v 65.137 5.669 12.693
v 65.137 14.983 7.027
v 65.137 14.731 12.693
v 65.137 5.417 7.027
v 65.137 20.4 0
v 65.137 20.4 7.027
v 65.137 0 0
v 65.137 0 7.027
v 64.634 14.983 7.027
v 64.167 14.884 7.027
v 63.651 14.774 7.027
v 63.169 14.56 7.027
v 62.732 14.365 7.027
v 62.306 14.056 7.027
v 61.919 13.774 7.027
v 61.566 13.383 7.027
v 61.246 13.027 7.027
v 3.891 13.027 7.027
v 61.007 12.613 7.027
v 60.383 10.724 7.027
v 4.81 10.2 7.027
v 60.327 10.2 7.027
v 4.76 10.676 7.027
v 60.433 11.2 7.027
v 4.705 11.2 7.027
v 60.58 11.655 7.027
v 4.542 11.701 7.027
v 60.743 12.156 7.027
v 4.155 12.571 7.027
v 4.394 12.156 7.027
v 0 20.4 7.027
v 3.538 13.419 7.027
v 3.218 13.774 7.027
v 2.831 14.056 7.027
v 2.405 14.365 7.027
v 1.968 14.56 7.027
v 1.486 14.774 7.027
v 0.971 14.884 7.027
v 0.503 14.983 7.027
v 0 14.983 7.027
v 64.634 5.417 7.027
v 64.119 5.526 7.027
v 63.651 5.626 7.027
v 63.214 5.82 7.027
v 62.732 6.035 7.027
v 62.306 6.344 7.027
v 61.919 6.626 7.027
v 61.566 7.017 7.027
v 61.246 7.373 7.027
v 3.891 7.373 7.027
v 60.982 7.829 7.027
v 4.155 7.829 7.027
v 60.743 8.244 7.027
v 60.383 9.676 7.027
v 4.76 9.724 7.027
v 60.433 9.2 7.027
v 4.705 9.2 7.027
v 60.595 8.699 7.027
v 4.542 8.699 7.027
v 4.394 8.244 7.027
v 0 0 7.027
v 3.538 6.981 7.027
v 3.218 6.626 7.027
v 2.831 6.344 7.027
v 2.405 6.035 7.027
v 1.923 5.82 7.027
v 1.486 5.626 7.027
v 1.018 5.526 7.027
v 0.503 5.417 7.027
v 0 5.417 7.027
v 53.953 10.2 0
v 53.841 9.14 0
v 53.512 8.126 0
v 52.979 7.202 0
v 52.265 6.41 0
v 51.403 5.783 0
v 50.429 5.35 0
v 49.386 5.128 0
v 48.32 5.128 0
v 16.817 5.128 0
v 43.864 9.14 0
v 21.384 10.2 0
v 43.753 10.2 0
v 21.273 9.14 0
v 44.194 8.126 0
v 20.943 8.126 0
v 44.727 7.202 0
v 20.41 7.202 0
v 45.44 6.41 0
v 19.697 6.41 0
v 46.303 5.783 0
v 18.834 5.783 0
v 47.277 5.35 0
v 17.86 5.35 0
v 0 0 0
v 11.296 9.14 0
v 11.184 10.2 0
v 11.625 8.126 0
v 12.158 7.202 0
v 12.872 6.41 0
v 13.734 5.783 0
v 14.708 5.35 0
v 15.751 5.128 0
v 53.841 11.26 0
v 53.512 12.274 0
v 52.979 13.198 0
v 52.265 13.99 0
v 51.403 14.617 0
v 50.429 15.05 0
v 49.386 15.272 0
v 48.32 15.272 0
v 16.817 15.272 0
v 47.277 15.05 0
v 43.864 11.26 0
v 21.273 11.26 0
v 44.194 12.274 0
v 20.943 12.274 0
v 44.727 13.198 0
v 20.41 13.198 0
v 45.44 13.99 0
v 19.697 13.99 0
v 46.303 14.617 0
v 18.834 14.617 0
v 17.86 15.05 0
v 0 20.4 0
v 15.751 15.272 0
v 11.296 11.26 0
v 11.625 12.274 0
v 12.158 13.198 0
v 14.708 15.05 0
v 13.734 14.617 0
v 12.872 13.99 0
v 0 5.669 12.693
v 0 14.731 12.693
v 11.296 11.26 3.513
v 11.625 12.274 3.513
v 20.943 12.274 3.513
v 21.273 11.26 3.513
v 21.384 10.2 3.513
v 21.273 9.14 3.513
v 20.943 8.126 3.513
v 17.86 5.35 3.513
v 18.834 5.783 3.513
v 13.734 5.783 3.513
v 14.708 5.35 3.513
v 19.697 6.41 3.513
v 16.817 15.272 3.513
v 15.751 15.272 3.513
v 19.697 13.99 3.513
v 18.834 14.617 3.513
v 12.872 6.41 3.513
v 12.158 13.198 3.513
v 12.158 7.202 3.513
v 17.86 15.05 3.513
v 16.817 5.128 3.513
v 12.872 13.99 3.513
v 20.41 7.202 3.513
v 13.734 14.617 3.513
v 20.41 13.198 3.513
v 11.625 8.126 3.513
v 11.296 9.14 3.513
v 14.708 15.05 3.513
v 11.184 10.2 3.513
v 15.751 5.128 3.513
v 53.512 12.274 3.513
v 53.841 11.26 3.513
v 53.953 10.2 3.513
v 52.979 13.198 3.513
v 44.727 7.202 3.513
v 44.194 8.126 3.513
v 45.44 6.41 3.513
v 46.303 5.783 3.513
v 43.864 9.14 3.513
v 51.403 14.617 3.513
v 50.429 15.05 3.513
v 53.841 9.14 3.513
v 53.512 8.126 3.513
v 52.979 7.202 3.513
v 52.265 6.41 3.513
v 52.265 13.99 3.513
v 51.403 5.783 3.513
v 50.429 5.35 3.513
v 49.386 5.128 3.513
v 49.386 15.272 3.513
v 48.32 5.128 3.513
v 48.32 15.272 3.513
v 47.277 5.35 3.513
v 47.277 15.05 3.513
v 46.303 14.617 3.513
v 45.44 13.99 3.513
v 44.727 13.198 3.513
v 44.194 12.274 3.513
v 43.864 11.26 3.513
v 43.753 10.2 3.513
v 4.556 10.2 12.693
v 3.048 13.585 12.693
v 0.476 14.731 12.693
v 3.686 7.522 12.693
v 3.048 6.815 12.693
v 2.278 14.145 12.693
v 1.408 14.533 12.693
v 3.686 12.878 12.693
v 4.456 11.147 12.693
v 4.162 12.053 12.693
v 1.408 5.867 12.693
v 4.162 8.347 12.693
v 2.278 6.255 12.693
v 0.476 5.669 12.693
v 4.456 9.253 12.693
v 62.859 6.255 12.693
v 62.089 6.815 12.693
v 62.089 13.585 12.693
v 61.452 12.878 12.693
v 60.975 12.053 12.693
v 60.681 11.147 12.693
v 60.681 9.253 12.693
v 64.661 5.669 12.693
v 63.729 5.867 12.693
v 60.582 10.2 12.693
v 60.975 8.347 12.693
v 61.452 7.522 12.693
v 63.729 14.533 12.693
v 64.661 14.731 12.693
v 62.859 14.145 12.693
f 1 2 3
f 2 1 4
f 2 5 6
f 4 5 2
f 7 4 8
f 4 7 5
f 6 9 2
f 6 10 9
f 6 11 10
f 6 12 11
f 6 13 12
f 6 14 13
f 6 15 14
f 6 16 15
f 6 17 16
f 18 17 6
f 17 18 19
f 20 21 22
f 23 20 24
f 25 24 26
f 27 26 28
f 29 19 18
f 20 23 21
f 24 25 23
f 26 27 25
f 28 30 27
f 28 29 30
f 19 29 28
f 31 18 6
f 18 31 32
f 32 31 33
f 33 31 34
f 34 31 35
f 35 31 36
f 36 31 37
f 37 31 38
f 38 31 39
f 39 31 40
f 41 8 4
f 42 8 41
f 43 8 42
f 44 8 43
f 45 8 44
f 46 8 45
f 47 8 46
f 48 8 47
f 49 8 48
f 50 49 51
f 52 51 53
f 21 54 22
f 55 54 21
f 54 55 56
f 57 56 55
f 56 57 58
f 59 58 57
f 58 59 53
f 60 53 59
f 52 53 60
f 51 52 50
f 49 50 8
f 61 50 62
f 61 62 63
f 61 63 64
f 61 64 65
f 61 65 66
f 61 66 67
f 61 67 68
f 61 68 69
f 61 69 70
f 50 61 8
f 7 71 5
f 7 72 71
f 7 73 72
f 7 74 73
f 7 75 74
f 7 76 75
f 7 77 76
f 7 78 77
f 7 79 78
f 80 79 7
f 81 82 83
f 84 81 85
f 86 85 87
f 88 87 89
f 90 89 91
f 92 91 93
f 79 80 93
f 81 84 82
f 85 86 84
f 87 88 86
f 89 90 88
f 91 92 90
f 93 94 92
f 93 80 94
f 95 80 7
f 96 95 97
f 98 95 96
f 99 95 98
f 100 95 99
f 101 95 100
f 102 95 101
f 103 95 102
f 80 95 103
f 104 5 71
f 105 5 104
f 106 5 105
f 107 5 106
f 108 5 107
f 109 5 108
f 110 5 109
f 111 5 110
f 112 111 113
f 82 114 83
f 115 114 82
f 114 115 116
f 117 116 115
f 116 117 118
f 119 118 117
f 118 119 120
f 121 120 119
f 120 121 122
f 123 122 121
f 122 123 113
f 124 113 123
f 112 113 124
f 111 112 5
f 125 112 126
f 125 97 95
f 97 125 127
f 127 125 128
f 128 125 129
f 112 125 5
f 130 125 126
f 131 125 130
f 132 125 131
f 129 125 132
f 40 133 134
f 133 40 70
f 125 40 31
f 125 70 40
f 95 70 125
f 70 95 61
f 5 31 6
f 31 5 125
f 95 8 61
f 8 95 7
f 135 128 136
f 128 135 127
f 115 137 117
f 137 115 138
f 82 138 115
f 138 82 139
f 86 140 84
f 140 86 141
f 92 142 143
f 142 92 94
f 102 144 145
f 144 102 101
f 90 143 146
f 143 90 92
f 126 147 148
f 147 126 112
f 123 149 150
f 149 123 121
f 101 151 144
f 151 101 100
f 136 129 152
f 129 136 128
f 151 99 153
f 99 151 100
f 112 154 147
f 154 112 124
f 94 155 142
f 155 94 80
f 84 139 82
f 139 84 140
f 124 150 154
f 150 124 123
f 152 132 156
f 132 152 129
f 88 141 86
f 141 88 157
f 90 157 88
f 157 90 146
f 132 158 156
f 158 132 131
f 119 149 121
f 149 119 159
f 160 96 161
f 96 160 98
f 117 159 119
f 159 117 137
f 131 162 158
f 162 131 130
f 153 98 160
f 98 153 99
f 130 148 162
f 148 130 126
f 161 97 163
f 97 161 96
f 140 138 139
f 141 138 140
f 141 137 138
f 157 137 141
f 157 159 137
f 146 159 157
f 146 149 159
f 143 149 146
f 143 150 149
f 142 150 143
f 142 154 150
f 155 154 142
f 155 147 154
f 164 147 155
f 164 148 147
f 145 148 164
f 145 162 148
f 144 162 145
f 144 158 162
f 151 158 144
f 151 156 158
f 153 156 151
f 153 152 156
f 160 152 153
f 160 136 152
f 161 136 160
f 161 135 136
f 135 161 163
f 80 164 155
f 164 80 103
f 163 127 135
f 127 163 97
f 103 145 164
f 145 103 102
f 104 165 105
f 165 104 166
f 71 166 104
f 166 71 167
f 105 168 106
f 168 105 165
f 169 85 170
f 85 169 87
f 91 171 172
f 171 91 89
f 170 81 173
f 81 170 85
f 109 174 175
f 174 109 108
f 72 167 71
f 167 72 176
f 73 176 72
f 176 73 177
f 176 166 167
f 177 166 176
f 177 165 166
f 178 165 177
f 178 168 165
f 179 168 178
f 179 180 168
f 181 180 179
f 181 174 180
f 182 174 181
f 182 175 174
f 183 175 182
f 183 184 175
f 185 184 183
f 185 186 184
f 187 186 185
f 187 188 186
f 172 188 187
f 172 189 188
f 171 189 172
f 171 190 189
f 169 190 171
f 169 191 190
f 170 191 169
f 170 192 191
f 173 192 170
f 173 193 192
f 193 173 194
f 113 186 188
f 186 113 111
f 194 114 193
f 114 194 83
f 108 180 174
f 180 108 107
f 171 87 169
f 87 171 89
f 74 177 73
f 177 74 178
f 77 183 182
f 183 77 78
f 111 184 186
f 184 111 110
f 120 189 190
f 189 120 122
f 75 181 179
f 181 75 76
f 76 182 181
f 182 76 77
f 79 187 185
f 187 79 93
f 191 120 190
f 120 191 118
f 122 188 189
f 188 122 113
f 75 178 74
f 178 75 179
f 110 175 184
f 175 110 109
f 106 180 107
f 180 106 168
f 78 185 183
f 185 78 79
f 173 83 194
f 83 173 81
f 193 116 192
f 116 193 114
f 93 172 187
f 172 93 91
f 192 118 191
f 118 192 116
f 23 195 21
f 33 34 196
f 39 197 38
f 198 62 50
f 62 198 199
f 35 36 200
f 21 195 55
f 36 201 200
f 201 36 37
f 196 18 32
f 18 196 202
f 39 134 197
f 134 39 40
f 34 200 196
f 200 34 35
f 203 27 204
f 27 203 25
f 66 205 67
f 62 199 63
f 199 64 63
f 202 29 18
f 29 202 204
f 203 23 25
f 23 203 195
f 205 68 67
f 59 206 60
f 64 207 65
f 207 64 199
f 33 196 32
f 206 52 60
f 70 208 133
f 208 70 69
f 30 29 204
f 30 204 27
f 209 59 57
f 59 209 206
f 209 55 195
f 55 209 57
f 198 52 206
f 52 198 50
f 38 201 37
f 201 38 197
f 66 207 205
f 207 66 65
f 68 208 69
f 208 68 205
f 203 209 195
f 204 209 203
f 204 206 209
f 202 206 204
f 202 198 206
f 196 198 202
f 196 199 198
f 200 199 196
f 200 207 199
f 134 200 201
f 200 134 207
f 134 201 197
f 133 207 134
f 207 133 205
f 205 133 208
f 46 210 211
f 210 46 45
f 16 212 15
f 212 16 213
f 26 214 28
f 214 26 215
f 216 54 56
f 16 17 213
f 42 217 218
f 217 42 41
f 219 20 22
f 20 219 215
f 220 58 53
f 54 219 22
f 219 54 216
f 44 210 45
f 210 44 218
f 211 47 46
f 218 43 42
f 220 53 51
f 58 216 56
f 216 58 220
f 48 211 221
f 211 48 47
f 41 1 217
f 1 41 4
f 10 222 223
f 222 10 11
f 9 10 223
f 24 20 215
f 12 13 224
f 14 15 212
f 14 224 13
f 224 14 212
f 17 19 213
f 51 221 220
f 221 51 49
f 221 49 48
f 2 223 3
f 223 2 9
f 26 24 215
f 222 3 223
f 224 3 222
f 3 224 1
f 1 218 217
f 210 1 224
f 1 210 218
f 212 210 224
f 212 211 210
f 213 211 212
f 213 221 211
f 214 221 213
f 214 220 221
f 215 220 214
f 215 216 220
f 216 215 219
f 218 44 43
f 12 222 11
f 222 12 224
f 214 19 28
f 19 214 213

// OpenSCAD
coldiameter = 17;
mod = coldiameter;
cpo = mod/10; // capitol offset
ch = mod*5* 1.24;
colid = 10.25;  			    //inner (open) diameter of column
colih = mod/3;				   // height of boss for column
length = ch * .618;  // for golden rectangle
height = ch/15;
width = (mod + (cpo*2))* 1.0;  //allows over or under hang if desired
angle = 1;

echo("Width=",width);

f_overhang = 2;			  //frieze overhang
f_height = height*2;		  //frieze height
f_d = .03; 					// amount of triglyph inset

c_overhang = 2;			  //cornice overhang
c_height = height *2/3;		  //cornice height
c_length = length;

//abacus();
//multi_abacus();
beam();
//corner();
//qr();
//tri();
//frieze_beam(2); 		  // parmeter is number of trigliphs
//frieze_corner();
//rotate([180,0,0]) translate([0,-18,-f_height-c_height]) {cornice_beam();}
//cornice_beam(1);
//cornice_corner();


module cornice_corner() {

}

module cornice_beam(type) {
	if ( type == 0 ) {
		cube([c_length,width+c_overhang,c_height]);
		}
	if ( type == 1 ) {
		cube([c_length*.75,width+c_overhang,c_height]);
		}
	
	translate([length*.065,width/6.5,c_height])
		cube([length/2-(length*.125),width-(width*.25),c_height/1.5]);

		if (type == 0 ) {
		translate([length/2 + (length*.065),width/6.5,c_height])
			cube([length/2-(length*.125),width-(width*.25),c_height/1.5]);
		}
		if (type == 1 ){
		translate([length/2 + (length*.055),width/6.5,c_height])
			cube([length/2-(length*.312),width-(width*.25),c_height/1.5]);
		}

}


module frieze_corner() {
	union() {	
	difference() {
	cube([length/2+mod/4,width,f_height]);
	translate([length/25,width/10,height/10])
		cube([length/2+mod/4-length/12,width-width/5,f_height]);
	translate([width/2,width/2,0])
		cylinder(h = height/2, r = width/8, $fs = angle);
	}
	//translate([width-length/20,0,0])  cube([length/25,width,f_height]);
	rotate([0,90,0]) {
		qr(length/2+mod/4);
	}
	translate([0,-f_height/12,f_height*.7]) cube([length/2+mod/4,f_height/12,f_height/6]);
	translate([0,0,f_height]) rotate([90.001,0,90])  {
		qr(length/2+mod/4);
	}
	translate([mod/4,-f_height/10,0])
		tri();
	//translate([(length/4)*2+(length/10),-f_height/15,0])
	//	tri();
	}
	union() {
	difference() {
	cube([width,(length/2)+(mod*.75),f_height]);
	translate([width/10,length/30,height/10])
		cube([width-width/5,(length/2)+(mod*.75)-length/15,f_height]);
	translate([width/2,width/2,0])
		cylinder(h = height/2, r = width/8, $fs = angle);
//	translate([width/2,3*length/4,0])
//		cylinder(h = height/2, r = width/8, $fs = angle);	
	}
	//translate([0,width-length/20,0])  cube([length/20,width,f_height]);
	translate([0,length/1.317,0]) rotate([90,90,0]) {
		qr(((length/2)+mod*.79));
	}
	translate([0,-length*.015,f_height]) rotate([180.001,270,90])  {
		qr(((length/2)+mod*.79));
	}
	translate([-f_height/12,-f_height/12,f_height*.7]) cube([f_height/12,length/2+coldiameter*.75+f_height/12,f_height/6]);
	translate([-f_height/10,mod*.76,0]) rotate([0,0,270])
		tri();
	translate([-f_height/10,length-(mod*.7),0]) rotate([0,0,270])
		tri();
	}
}


module frieze_beam(number) {
union() {
	difference() {
	cube([length,width,f_height]);
	translate([length/20,width/10,height/10])
		cube([length-length/10,width-width/5,f_height]);
	translate([length/4,width/2,0])
			cylinder(h = height/2, r = width/8, $fs = angle);
	translate([3*length/4,width/2,0])
			cylinder(h = height/2, r = width/8, $fs = angle);	}
	translate([length/2-length/20,0,0])  cube([length/10,width,f_height]);
	rotate([0,90,0]) {
		qr(length);
	}
	translate([0,0,f_height]) rotate([90.001,0,90])  {
		qr(length);
	}
//	translate([0,width,0]) rotate([90,180,90])  {
//		qr(length);
//	}
//	translate([0,width,f_height]) rotate([90,270,90])  {
//		qr(length);
//	}
#translate([0,-f_height/12,f_height*.7]) cube([length,f_height/12,f_height/6]);
if ( number == 3 ) {
	translate([0,-f_height/15,0])
		tri();
	translate([(length/5)*2,-f_height/15,0])
		tri();
	translate([(length/5)*4,-f_height/15,0])
		tri();
	}
else if ( number == 2 ){
	translate([(length/4)*0,-f_height/10,0])
		tri();
	translate([(length/4)*2,-f_height/10,0])
		tri();
	}
}
}


module qr(len) {

	difference() {
		cylinder(h = len, r = f_height/6, $fs = angle);
		translate([-f_height/3,0,0])
			cube([f_height/2.5,f_height/4,len]);
		translate([0,-f_height/4,0])
			cube([f_height/4,f_height/2,len]);
		}
}

module tri() {
	difference() {

		translate([0,0,f_height/7])
			cube([mod/2,f_height/10,f_height-f_height/3]);					//basic plate shape
		translate([0,-f_height*f_d,0])
			scale([1,1.5,1]) cylinder(r = mod*.05, h = f_height-f_height/6, $fs = .05);	//left half groove
		translate([modr*.167,-f_height*f_d,0])
			scale([1,1.5,1]) cylinder(r = mod*.05, h = f_height-f_height/6, $fs = .05);	//left full groove
		translate([mod*.333,-f_height*f_d,0])
			scale([1,1.5,1]) cylinder(r = mod*.05, h = f_height-f_height/6, $fs = .05);	//right full groove
		translate([mod/2,-f_height*f_d,0])
			scale([1,1.5,1]) cylinder(r = mod*.05, h = f_height-f_height/6, $fs = .05);	//right half groove
		}
	translate([0,-f_height/20,f_height*.7])
		cube([mod/2,f_height/7,f_height/7]);
}

module beam() {
	difference() {
		cube([length, width, height]);
		translate([length/4,width/2,0])
			cylinder(h = height/2, r = width/4, $fs = angle);
		translate([3*length/4,width/2,0])
			cylinder(h = height/2, r = width/4, $fs = angle);		}
	difference() {
		translate([0,width/2,0])
			cylinder(h = (height + colih), r1 = colid/2, r2 = colid/2.25, $fs = angle);
		translate([-colid/2,0,0])
			cube([colid/2,width,height*2]);
		}
	difference() {
		translate([length,width/2,0])
			cylinder(h = (height + colih), r1 = colid/2, r2 = colid/2.25, $fs = angle);
		translate([length,0,0])
			cube([colid/2,width,height*2]);
		}
}

module corner() {
	difference() {
		cube([length+width/2, width, height]);
		translate([width/2,width/2,0])
			cylinder(h = height/2, r = width/8, $fs = angle);
		translate([3*(length+width/2)/4,width/2,0])
			cylinder(h = height/2, r = width/8, $fs = angle);	
		}
	difference() {
		translate([0,width,0])
			cube([width, length-width/2, height]);
		translate([width/2,3*(length+width/2)/4,0])
			cylinder(h = height/2, r = width/8, $fs = angle);
		}
	translate([width/2,width/2,height/2])
		cylinder(h = (height/2 + colih), r = colid/2, $fs = angle);
	difference() {
		translate([length+width/2,width/2,0])
			cylinder(h = (height + colih), r = colid/2, $fs = angle);
		translate([length+width/2,0,0])
			cube([colid/2,width,height*2]);
		}
	difference() {
		translate([width/2,length+width/2,0])
			cylinder(h = (height + colih), r = colid/2, $fs = angle);
		translate([0,length+width/2,0])
			cube([width,colid/2,height*2]);
		}
}

module abacus() {
	translate([(width*1.1)/2,(width*1.1)/2,height/2])
		cylinder(h = height/2, r = colid/2, $fs = angle);
	difference() {
		cube([width*1.1,width*1.1,height/2]);
		translate([(width*1.1)/2,(width*1.1)/2,0])
			cylinder(h = (height/2)-.65, r =colid/1.75, $fs = angle);
		}
}

module multi_abacus() {
abacus();
translate([width*1.5,0,0])
	abacus();
translate([0,width*1.5,0])
	abacus();
translate([width*1.5,width*1.5,0])
	abacus();
}
